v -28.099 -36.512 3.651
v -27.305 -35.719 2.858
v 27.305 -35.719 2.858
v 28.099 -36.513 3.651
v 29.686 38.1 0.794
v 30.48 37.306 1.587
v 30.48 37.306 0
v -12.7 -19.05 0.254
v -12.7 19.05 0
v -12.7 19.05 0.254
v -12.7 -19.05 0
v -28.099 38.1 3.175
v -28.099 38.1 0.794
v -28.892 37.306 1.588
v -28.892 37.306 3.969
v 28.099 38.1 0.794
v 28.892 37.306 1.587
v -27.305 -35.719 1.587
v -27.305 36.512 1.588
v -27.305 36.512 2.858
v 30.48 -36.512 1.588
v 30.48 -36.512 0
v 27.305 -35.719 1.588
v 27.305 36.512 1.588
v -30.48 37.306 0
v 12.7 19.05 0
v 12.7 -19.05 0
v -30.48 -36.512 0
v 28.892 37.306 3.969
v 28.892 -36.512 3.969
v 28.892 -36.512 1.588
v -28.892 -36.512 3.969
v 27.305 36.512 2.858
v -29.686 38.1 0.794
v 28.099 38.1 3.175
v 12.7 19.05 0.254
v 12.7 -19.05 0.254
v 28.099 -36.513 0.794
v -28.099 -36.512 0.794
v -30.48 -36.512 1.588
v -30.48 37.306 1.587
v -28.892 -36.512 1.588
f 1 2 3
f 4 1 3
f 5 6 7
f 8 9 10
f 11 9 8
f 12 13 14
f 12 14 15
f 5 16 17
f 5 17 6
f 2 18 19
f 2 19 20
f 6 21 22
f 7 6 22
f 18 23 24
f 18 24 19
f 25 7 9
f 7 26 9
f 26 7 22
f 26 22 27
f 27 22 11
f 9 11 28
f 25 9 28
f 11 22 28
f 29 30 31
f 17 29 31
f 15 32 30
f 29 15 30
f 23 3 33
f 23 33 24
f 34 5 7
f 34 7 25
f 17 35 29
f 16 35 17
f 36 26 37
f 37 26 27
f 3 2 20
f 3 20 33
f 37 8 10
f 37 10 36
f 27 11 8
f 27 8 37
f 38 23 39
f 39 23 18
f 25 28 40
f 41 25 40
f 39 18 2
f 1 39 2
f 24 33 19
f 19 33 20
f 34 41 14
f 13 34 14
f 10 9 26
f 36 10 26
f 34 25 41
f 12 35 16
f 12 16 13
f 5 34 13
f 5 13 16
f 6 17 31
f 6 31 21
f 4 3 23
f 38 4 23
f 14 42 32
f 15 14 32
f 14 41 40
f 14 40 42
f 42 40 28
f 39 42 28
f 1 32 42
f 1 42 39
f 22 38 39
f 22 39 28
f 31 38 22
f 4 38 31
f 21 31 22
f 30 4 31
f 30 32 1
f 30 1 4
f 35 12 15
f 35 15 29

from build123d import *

# Parameters (mm, degrees)
F1_DEPTH = 36.5125
F2_W     = 54.61
F2_H     = 1.27
F3_DEPTH = 1.5875
F4_SIZE  = 0.79374
F5_W     = 25.4
F5_H     = 38.1
F6_DEPTH = 0.254


# Not quite as in the source:
# - a fillet or chamfer is up to 0.001 mm smaller than in the source, because OpenCascade refuses the exact size


with BuildPart() as f1:
    # F0 (on Front) → F1 (new body, symmetric)
    with BuildSketch(Plane.XZ):
        Polygon((27.305, 0), (30.48, 0), (30.48, 1.5875), (28.8925, 1.5875), (28.8925, 3.96875), (0, 3.96875), (0, 2.8575), (27.305, 2.8575), (27.305, 1.5875), (0, 1.5875), (0, 0), align=None)
        Polygon((-27.305, 0), (0, 0), (0, 1.5875), (-27.305, 1.5875), (-27.305, 2.8575), (0, 2.8575), (0, 3.96875), (-28.8925, 3.96875), (-28.8925, 1.5875), (-30.48, 1.5875), (-30.48, 0), align=None)
    extrude(amount=F1_DEPTH, both=True)

    # F2 (on face) → F3 (join)
    with BuildSketch(Plane(origin=(0, 36.5125, 0), x_dir=(-1, 0, 0), z_dir=(0, 1, 0))):
        Polygon((-30.48, 1.5875), (-30.48, 0), (30.48, 0), (30.48, 1.5875), (28.8925, 1.5875), (28.8925, 3.96875), (-28.8925, 3.96875), (-28.8925, 1.5875), align=None)
        with Locations((0, 2.2225)):
            Rectangle(F2_W, F2_H, mode=Mode.SUBTRACT)
        with Locations((0, 2.2225)):
            Rectangle(F2_W, F2_H)
    extrude(amount=F3_DEPTH)

    # F4 (size 0.79375 in the source; OpenCascade refuses exactly that, so slightly less here)
    f4_edges = [f1.edges().sort_by_distance(p)[0] for p in [
        (27.305, -36.5125, 2.2225),
        (0, -36.5125, 1.5875),
        (0, -36.5125, 2.8575),
        (-27.305, -36.5125, 2.2225),
        (29.68625, 38.1, 1.5875),
        (28.8925, 38.1, 2.778125),
        (0, 38.1, 3.96875),
        (0, 38.1, 0),
        (30.48, 38.1, 0.79375),
        (-28.8925, 38.1, 2.778125),
        (-29.68625, 38.1, 1.5875),
        (-30.48, 38.1, 0.79375),
    ]]
    chamfer(f4_edges, length=F4_SIZE)

    # F5 (on face) → F6 (cut)
    with BuildSketch(Plane(origin=(0, 0, 0), x_dir=(1, 0, 0), z_dir=(0, 0, -1))):
        Rectangle(F5_W, F5_H)
    extrude(amount=-F6_DEPTH, mode=Mode.SUBTRACT)


solid = f1.part
